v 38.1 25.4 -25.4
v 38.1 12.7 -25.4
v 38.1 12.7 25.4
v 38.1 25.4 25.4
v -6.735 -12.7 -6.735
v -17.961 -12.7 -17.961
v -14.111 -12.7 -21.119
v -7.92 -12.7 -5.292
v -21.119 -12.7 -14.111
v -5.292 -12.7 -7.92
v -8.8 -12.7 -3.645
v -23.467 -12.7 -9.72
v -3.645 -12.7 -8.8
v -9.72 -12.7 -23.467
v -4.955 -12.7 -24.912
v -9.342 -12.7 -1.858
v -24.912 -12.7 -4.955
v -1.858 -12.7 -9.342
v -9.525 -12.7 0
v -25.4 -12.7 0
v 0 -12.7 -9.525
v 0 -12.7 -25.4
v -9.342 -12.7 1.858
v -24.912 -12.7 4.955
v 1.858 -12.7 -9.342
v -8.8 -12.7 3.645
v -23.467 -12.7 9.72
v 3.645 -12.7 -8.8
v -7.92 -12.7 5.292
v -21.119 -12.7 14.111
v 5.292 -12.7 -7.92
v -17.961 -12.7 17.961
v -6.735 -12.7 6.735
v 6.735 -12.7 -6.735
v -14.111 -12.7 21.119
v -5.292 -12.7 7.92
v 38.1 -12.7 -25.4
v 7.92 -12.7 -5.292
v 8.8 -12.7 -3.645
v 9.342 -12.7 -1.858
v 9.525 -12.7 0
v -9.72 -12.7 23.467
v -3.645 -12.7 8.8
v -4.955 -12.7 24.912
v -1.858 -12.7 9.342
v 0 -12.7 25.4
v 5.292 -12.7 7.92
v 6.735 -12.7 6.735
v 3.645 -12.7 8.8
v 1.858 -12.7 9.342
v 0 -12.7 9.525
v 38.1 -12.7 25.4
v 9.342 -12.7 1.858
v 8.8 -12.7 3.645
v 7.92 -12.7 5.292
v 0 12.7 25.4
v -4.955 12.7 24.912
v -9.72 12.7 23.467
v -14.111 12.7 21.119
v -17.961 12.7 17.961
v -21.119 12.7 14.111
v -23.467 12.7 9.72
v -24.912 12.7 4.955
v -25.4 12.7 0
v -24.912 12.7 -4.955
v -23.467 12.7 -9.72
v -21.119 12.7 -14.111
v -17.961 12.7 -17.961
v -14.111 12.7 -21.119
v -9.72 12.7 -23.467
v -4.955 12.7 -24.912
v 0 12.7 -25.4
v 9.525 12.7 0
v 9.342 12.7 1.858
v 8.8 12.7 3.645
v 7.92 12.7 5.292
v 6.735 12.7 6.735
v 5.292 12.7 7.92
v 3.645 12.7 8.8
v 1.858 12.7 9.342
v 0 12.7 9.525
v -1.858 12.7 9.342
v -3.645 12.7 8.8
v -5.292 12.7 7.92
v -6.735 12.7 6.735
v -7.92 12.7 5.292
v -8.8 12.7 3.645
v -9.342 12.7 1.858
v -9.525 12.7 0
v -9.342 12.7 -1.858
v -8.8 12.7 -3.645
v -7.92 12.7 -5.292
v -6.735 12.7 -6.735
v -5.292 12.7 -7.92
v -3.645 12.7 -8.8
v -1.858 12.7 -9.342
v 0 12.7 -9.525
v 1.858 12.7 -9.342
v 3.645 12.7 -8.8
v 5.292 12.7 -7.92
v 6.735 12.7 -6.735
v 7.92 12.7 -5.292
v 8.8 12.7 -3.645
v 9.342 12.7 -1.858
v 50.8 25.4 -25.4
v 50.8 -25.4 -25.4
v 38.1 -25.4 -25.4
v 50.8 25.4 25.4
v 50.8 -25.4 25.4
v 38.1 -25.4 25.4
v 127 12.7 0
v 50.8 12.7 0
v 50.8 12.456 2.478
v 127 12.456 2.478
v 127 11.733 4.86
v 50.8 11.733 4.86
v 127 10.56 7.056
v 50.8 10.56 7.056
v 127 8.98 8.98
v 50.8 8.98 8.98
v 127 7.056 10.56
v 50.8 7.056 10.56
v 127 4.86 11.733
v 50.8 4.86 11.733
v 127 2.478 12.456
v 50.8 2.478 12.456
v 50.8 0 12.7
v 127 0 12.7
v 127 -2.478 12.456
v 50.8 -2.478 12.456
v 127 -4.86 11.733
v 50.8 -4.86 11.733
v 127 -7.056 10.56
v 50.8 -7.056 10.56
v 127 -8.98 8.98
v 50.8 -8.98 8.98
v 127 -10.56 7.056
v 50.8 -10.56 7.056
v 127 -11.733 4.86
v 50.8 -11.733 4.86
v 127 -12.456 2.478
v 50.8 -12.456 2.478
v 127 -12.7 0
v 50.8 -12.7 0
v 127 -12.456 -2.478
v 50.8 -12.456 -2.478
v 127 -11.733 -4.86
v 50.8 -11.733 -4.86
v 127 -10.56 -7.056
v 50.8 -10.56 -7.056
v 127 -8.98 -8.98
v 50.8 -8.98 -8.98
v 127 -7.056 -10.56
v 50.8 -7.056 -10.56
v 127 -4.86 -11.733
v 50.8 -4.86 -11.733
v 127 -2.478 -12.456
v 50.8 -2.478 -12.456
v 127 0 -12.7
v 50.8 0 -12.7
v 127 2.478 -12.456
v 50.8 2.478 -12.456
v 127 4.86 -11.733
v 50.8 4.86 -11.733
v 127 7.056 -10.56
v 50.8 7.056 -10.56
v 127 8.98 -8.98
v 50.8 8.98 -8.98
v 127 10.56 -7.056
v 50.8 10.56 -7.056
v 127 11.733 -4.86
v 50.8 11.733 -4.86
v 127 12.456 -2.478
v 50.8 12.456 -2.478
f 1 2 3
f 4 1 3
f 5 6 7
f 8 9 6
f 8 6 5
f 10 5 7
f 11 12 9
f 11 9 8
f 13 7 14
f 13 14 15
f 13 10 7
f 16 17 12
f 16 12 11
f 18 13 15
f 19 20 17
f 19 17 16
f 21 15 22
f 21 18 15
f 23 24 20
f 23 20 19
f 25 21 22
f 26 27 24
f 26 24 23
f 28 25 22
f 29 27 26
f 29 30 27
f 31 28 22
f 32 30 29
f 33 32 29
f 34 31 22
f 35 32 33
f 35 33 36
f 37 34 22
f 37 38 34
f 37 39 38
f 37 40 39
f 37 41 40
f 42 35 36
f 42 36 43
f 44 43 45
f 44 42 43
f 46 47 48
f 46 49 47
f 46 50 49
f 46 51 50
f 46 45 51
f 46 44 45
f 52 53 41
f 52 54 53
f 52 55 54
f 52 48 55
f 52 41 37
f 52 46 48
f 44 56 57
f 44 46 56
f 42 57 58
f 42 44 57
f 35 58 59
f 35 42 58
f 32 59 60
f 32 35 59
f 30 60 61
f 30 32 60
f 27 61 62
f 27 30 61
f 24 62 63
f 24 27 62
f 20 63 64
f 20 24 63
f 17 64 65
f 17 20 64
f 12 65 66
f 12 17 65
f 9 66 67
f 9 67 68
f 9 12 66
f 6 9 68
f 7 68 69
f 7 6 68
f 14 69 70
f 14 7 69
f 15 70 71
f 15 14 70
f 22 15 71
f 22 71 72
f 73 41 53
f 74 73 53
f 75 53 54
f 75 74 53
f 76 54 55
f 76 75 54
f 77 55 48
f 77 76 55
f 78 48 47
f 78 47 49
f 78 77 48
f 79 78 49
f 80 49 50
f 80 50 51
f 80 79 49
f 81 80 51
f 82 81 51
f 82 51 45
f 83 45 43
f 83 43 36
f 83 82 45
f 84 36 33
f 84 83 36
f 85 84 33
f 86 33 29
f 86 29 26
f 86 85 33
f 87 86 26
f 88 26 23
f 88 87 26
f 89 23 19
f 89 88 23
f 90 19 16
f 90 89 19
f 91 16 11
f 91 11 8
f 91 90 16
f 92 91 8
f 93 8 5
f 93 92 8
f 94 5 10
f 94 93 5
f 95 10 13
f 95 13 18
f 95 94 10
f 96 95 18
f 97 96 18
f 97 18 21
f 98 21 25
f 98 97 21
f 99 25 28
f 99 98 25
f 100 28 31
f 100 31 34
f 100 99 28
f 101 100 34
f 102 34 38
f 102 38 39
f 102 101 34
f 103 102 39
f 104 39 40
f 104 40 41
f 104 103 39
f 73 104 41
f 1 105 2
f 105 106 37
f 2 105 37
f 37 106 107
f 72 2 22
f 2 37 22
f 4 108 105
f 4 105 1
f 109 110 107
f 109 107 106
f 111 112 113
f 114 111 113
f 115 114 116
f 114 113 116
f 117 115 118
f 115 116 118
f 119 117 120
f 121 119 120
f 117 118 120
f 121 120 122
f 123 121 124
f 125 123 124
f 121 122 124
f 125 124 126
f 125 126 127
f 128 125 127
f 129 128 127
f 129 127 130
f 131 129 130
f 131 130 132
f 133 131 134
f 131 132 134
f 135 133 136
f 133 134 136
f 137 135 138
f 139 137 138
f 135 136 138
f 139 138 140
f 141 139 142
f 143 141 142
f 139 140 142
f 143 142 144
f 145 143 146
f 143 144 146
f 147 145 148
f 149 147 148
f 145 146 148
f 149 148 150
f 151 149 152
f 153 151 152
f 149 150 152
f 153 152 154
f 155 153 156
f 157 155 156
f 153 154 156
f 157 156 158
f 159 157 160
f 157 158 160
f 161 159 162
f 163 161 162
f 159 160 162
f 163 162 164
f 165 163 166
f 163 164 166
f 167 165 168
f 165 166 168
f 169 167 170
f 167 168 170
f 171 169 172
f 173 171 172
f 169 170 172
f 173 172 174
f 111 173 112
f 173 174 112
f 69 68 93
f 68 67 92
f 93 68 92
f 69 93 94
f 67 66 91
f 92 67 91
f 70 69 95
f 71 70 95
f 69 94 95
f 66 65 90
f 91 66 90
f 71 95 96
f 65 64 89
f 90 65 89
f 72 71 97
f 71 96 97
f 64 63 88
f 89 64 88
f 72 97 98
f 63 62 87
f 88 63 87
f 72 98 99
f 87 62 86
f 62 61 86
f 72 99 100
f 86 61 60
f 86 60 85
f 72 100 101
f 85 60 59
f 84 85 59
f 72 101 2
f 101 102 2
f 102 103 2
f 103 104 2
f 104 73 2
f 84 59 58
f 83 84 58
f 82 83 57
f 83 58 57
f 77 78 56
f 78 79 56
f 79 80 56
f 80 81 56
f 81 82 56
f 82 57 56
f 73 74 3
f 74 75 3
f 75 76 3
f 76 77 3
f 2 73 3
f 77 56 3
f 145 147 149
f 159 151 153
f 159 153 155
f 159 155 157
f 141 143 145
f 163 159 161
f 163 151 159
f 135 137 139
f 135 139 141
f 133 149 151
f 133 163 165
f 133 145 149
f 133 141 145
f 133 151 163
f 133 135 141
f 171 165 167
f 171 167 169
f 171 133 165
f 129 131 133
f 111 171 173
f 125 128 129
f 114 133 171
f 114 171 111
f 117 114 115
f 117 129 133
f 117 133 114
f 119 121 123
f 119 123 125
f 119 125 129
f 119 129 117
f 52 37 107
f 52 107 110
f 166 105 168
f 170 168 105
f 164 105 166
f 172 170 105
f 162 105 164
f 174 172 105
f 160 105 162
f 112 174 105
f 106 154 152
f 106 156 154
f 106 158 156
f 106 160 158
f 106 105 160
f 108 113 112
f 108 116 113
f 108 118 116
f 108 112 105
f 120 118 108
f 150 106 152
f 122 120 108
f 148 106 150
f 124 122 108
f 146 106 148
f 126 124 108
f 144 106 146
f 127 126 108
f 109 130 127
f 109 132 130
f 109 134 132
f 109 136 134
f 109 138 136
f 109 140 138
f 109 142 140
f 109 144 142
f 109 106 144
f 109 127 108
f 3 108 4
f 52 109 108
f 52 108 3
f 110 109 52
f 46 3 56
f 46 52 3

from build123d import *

# Parameters (mm, degrees)
F0_R     = 9.525
F0_W     = 12.7
F0_H     = 50.8
F1_DEPTH = 12.7
F2_W     = 12.7
F2_H     = 50.8
F3_DEPTH = 12.7
F4_W     = 12.7
F4_H     = 50.8
F5_DEPTH = 12.7
F6_R     = 12.7
F7_DEPTH = 76.2


with BuildPart() as f1:
    # F0 (on Front) → F1 (new body, symmetric)
    with BuildSketch(Plane.XZ):
        with BuildLine():
            ThreePointArc((0, -25.4), (17.960512, -17.960512), (25.4, 0))
            ThreePointArc((25.4, 0), (17.960512, 17.960512), (0, 25.4))
            ThreePointArc((0, 25.4), (-25.4, 0), (0, -25.4))
        make_face()
        Circle(F0_R, mode=Mode.SUBTRACT)
        with BuildLine():
            ThreePointArc((0, 25.4), (17.960512, 17.960512), (25.4, 0))
            ThreePointArc((25.4, 0), (17.960512, -17.960512), (0, -25.4))
            Line((0, -25.4), (38.1, -25.4))
            Line((38.1, -25.4), (38.1, 25.4))
            Line((38.1, 25.4), (0, 25.4))
        make_face()
        with Locations((44.45, 0)):
            Rectangle(F0_W, F0_H)
    extrude(amount=F1_DEPTH, both=True)

    # F2 (on face) → F3 (join)
    with BuildSketch(Plane.XZ.offset(12.7)):
        with Locations((44.45, 0)):
            Rectangle(F2_W, F2_H)
    extrude(amount=F3_DEPTH)

    # F4 (on face) → F5 (join)
    with BuildSketch(Plane(origin=(0, 12.7, 0), x_dir=(-1, 0, 0), z_dir=(0, 1, 0))):
        with Locations((-44.45, 0)):
            Rectangle(F4_W, F4_H)
    extrude(amount=F5_DEPTH)

    # F6 (on face) → F7 (join)
    with BuildSketch(Plane.YZ.offset(50.8)):
        Circle(F6_R)
    extrude(amount=F7_DEPTH)


solid = f1.part
